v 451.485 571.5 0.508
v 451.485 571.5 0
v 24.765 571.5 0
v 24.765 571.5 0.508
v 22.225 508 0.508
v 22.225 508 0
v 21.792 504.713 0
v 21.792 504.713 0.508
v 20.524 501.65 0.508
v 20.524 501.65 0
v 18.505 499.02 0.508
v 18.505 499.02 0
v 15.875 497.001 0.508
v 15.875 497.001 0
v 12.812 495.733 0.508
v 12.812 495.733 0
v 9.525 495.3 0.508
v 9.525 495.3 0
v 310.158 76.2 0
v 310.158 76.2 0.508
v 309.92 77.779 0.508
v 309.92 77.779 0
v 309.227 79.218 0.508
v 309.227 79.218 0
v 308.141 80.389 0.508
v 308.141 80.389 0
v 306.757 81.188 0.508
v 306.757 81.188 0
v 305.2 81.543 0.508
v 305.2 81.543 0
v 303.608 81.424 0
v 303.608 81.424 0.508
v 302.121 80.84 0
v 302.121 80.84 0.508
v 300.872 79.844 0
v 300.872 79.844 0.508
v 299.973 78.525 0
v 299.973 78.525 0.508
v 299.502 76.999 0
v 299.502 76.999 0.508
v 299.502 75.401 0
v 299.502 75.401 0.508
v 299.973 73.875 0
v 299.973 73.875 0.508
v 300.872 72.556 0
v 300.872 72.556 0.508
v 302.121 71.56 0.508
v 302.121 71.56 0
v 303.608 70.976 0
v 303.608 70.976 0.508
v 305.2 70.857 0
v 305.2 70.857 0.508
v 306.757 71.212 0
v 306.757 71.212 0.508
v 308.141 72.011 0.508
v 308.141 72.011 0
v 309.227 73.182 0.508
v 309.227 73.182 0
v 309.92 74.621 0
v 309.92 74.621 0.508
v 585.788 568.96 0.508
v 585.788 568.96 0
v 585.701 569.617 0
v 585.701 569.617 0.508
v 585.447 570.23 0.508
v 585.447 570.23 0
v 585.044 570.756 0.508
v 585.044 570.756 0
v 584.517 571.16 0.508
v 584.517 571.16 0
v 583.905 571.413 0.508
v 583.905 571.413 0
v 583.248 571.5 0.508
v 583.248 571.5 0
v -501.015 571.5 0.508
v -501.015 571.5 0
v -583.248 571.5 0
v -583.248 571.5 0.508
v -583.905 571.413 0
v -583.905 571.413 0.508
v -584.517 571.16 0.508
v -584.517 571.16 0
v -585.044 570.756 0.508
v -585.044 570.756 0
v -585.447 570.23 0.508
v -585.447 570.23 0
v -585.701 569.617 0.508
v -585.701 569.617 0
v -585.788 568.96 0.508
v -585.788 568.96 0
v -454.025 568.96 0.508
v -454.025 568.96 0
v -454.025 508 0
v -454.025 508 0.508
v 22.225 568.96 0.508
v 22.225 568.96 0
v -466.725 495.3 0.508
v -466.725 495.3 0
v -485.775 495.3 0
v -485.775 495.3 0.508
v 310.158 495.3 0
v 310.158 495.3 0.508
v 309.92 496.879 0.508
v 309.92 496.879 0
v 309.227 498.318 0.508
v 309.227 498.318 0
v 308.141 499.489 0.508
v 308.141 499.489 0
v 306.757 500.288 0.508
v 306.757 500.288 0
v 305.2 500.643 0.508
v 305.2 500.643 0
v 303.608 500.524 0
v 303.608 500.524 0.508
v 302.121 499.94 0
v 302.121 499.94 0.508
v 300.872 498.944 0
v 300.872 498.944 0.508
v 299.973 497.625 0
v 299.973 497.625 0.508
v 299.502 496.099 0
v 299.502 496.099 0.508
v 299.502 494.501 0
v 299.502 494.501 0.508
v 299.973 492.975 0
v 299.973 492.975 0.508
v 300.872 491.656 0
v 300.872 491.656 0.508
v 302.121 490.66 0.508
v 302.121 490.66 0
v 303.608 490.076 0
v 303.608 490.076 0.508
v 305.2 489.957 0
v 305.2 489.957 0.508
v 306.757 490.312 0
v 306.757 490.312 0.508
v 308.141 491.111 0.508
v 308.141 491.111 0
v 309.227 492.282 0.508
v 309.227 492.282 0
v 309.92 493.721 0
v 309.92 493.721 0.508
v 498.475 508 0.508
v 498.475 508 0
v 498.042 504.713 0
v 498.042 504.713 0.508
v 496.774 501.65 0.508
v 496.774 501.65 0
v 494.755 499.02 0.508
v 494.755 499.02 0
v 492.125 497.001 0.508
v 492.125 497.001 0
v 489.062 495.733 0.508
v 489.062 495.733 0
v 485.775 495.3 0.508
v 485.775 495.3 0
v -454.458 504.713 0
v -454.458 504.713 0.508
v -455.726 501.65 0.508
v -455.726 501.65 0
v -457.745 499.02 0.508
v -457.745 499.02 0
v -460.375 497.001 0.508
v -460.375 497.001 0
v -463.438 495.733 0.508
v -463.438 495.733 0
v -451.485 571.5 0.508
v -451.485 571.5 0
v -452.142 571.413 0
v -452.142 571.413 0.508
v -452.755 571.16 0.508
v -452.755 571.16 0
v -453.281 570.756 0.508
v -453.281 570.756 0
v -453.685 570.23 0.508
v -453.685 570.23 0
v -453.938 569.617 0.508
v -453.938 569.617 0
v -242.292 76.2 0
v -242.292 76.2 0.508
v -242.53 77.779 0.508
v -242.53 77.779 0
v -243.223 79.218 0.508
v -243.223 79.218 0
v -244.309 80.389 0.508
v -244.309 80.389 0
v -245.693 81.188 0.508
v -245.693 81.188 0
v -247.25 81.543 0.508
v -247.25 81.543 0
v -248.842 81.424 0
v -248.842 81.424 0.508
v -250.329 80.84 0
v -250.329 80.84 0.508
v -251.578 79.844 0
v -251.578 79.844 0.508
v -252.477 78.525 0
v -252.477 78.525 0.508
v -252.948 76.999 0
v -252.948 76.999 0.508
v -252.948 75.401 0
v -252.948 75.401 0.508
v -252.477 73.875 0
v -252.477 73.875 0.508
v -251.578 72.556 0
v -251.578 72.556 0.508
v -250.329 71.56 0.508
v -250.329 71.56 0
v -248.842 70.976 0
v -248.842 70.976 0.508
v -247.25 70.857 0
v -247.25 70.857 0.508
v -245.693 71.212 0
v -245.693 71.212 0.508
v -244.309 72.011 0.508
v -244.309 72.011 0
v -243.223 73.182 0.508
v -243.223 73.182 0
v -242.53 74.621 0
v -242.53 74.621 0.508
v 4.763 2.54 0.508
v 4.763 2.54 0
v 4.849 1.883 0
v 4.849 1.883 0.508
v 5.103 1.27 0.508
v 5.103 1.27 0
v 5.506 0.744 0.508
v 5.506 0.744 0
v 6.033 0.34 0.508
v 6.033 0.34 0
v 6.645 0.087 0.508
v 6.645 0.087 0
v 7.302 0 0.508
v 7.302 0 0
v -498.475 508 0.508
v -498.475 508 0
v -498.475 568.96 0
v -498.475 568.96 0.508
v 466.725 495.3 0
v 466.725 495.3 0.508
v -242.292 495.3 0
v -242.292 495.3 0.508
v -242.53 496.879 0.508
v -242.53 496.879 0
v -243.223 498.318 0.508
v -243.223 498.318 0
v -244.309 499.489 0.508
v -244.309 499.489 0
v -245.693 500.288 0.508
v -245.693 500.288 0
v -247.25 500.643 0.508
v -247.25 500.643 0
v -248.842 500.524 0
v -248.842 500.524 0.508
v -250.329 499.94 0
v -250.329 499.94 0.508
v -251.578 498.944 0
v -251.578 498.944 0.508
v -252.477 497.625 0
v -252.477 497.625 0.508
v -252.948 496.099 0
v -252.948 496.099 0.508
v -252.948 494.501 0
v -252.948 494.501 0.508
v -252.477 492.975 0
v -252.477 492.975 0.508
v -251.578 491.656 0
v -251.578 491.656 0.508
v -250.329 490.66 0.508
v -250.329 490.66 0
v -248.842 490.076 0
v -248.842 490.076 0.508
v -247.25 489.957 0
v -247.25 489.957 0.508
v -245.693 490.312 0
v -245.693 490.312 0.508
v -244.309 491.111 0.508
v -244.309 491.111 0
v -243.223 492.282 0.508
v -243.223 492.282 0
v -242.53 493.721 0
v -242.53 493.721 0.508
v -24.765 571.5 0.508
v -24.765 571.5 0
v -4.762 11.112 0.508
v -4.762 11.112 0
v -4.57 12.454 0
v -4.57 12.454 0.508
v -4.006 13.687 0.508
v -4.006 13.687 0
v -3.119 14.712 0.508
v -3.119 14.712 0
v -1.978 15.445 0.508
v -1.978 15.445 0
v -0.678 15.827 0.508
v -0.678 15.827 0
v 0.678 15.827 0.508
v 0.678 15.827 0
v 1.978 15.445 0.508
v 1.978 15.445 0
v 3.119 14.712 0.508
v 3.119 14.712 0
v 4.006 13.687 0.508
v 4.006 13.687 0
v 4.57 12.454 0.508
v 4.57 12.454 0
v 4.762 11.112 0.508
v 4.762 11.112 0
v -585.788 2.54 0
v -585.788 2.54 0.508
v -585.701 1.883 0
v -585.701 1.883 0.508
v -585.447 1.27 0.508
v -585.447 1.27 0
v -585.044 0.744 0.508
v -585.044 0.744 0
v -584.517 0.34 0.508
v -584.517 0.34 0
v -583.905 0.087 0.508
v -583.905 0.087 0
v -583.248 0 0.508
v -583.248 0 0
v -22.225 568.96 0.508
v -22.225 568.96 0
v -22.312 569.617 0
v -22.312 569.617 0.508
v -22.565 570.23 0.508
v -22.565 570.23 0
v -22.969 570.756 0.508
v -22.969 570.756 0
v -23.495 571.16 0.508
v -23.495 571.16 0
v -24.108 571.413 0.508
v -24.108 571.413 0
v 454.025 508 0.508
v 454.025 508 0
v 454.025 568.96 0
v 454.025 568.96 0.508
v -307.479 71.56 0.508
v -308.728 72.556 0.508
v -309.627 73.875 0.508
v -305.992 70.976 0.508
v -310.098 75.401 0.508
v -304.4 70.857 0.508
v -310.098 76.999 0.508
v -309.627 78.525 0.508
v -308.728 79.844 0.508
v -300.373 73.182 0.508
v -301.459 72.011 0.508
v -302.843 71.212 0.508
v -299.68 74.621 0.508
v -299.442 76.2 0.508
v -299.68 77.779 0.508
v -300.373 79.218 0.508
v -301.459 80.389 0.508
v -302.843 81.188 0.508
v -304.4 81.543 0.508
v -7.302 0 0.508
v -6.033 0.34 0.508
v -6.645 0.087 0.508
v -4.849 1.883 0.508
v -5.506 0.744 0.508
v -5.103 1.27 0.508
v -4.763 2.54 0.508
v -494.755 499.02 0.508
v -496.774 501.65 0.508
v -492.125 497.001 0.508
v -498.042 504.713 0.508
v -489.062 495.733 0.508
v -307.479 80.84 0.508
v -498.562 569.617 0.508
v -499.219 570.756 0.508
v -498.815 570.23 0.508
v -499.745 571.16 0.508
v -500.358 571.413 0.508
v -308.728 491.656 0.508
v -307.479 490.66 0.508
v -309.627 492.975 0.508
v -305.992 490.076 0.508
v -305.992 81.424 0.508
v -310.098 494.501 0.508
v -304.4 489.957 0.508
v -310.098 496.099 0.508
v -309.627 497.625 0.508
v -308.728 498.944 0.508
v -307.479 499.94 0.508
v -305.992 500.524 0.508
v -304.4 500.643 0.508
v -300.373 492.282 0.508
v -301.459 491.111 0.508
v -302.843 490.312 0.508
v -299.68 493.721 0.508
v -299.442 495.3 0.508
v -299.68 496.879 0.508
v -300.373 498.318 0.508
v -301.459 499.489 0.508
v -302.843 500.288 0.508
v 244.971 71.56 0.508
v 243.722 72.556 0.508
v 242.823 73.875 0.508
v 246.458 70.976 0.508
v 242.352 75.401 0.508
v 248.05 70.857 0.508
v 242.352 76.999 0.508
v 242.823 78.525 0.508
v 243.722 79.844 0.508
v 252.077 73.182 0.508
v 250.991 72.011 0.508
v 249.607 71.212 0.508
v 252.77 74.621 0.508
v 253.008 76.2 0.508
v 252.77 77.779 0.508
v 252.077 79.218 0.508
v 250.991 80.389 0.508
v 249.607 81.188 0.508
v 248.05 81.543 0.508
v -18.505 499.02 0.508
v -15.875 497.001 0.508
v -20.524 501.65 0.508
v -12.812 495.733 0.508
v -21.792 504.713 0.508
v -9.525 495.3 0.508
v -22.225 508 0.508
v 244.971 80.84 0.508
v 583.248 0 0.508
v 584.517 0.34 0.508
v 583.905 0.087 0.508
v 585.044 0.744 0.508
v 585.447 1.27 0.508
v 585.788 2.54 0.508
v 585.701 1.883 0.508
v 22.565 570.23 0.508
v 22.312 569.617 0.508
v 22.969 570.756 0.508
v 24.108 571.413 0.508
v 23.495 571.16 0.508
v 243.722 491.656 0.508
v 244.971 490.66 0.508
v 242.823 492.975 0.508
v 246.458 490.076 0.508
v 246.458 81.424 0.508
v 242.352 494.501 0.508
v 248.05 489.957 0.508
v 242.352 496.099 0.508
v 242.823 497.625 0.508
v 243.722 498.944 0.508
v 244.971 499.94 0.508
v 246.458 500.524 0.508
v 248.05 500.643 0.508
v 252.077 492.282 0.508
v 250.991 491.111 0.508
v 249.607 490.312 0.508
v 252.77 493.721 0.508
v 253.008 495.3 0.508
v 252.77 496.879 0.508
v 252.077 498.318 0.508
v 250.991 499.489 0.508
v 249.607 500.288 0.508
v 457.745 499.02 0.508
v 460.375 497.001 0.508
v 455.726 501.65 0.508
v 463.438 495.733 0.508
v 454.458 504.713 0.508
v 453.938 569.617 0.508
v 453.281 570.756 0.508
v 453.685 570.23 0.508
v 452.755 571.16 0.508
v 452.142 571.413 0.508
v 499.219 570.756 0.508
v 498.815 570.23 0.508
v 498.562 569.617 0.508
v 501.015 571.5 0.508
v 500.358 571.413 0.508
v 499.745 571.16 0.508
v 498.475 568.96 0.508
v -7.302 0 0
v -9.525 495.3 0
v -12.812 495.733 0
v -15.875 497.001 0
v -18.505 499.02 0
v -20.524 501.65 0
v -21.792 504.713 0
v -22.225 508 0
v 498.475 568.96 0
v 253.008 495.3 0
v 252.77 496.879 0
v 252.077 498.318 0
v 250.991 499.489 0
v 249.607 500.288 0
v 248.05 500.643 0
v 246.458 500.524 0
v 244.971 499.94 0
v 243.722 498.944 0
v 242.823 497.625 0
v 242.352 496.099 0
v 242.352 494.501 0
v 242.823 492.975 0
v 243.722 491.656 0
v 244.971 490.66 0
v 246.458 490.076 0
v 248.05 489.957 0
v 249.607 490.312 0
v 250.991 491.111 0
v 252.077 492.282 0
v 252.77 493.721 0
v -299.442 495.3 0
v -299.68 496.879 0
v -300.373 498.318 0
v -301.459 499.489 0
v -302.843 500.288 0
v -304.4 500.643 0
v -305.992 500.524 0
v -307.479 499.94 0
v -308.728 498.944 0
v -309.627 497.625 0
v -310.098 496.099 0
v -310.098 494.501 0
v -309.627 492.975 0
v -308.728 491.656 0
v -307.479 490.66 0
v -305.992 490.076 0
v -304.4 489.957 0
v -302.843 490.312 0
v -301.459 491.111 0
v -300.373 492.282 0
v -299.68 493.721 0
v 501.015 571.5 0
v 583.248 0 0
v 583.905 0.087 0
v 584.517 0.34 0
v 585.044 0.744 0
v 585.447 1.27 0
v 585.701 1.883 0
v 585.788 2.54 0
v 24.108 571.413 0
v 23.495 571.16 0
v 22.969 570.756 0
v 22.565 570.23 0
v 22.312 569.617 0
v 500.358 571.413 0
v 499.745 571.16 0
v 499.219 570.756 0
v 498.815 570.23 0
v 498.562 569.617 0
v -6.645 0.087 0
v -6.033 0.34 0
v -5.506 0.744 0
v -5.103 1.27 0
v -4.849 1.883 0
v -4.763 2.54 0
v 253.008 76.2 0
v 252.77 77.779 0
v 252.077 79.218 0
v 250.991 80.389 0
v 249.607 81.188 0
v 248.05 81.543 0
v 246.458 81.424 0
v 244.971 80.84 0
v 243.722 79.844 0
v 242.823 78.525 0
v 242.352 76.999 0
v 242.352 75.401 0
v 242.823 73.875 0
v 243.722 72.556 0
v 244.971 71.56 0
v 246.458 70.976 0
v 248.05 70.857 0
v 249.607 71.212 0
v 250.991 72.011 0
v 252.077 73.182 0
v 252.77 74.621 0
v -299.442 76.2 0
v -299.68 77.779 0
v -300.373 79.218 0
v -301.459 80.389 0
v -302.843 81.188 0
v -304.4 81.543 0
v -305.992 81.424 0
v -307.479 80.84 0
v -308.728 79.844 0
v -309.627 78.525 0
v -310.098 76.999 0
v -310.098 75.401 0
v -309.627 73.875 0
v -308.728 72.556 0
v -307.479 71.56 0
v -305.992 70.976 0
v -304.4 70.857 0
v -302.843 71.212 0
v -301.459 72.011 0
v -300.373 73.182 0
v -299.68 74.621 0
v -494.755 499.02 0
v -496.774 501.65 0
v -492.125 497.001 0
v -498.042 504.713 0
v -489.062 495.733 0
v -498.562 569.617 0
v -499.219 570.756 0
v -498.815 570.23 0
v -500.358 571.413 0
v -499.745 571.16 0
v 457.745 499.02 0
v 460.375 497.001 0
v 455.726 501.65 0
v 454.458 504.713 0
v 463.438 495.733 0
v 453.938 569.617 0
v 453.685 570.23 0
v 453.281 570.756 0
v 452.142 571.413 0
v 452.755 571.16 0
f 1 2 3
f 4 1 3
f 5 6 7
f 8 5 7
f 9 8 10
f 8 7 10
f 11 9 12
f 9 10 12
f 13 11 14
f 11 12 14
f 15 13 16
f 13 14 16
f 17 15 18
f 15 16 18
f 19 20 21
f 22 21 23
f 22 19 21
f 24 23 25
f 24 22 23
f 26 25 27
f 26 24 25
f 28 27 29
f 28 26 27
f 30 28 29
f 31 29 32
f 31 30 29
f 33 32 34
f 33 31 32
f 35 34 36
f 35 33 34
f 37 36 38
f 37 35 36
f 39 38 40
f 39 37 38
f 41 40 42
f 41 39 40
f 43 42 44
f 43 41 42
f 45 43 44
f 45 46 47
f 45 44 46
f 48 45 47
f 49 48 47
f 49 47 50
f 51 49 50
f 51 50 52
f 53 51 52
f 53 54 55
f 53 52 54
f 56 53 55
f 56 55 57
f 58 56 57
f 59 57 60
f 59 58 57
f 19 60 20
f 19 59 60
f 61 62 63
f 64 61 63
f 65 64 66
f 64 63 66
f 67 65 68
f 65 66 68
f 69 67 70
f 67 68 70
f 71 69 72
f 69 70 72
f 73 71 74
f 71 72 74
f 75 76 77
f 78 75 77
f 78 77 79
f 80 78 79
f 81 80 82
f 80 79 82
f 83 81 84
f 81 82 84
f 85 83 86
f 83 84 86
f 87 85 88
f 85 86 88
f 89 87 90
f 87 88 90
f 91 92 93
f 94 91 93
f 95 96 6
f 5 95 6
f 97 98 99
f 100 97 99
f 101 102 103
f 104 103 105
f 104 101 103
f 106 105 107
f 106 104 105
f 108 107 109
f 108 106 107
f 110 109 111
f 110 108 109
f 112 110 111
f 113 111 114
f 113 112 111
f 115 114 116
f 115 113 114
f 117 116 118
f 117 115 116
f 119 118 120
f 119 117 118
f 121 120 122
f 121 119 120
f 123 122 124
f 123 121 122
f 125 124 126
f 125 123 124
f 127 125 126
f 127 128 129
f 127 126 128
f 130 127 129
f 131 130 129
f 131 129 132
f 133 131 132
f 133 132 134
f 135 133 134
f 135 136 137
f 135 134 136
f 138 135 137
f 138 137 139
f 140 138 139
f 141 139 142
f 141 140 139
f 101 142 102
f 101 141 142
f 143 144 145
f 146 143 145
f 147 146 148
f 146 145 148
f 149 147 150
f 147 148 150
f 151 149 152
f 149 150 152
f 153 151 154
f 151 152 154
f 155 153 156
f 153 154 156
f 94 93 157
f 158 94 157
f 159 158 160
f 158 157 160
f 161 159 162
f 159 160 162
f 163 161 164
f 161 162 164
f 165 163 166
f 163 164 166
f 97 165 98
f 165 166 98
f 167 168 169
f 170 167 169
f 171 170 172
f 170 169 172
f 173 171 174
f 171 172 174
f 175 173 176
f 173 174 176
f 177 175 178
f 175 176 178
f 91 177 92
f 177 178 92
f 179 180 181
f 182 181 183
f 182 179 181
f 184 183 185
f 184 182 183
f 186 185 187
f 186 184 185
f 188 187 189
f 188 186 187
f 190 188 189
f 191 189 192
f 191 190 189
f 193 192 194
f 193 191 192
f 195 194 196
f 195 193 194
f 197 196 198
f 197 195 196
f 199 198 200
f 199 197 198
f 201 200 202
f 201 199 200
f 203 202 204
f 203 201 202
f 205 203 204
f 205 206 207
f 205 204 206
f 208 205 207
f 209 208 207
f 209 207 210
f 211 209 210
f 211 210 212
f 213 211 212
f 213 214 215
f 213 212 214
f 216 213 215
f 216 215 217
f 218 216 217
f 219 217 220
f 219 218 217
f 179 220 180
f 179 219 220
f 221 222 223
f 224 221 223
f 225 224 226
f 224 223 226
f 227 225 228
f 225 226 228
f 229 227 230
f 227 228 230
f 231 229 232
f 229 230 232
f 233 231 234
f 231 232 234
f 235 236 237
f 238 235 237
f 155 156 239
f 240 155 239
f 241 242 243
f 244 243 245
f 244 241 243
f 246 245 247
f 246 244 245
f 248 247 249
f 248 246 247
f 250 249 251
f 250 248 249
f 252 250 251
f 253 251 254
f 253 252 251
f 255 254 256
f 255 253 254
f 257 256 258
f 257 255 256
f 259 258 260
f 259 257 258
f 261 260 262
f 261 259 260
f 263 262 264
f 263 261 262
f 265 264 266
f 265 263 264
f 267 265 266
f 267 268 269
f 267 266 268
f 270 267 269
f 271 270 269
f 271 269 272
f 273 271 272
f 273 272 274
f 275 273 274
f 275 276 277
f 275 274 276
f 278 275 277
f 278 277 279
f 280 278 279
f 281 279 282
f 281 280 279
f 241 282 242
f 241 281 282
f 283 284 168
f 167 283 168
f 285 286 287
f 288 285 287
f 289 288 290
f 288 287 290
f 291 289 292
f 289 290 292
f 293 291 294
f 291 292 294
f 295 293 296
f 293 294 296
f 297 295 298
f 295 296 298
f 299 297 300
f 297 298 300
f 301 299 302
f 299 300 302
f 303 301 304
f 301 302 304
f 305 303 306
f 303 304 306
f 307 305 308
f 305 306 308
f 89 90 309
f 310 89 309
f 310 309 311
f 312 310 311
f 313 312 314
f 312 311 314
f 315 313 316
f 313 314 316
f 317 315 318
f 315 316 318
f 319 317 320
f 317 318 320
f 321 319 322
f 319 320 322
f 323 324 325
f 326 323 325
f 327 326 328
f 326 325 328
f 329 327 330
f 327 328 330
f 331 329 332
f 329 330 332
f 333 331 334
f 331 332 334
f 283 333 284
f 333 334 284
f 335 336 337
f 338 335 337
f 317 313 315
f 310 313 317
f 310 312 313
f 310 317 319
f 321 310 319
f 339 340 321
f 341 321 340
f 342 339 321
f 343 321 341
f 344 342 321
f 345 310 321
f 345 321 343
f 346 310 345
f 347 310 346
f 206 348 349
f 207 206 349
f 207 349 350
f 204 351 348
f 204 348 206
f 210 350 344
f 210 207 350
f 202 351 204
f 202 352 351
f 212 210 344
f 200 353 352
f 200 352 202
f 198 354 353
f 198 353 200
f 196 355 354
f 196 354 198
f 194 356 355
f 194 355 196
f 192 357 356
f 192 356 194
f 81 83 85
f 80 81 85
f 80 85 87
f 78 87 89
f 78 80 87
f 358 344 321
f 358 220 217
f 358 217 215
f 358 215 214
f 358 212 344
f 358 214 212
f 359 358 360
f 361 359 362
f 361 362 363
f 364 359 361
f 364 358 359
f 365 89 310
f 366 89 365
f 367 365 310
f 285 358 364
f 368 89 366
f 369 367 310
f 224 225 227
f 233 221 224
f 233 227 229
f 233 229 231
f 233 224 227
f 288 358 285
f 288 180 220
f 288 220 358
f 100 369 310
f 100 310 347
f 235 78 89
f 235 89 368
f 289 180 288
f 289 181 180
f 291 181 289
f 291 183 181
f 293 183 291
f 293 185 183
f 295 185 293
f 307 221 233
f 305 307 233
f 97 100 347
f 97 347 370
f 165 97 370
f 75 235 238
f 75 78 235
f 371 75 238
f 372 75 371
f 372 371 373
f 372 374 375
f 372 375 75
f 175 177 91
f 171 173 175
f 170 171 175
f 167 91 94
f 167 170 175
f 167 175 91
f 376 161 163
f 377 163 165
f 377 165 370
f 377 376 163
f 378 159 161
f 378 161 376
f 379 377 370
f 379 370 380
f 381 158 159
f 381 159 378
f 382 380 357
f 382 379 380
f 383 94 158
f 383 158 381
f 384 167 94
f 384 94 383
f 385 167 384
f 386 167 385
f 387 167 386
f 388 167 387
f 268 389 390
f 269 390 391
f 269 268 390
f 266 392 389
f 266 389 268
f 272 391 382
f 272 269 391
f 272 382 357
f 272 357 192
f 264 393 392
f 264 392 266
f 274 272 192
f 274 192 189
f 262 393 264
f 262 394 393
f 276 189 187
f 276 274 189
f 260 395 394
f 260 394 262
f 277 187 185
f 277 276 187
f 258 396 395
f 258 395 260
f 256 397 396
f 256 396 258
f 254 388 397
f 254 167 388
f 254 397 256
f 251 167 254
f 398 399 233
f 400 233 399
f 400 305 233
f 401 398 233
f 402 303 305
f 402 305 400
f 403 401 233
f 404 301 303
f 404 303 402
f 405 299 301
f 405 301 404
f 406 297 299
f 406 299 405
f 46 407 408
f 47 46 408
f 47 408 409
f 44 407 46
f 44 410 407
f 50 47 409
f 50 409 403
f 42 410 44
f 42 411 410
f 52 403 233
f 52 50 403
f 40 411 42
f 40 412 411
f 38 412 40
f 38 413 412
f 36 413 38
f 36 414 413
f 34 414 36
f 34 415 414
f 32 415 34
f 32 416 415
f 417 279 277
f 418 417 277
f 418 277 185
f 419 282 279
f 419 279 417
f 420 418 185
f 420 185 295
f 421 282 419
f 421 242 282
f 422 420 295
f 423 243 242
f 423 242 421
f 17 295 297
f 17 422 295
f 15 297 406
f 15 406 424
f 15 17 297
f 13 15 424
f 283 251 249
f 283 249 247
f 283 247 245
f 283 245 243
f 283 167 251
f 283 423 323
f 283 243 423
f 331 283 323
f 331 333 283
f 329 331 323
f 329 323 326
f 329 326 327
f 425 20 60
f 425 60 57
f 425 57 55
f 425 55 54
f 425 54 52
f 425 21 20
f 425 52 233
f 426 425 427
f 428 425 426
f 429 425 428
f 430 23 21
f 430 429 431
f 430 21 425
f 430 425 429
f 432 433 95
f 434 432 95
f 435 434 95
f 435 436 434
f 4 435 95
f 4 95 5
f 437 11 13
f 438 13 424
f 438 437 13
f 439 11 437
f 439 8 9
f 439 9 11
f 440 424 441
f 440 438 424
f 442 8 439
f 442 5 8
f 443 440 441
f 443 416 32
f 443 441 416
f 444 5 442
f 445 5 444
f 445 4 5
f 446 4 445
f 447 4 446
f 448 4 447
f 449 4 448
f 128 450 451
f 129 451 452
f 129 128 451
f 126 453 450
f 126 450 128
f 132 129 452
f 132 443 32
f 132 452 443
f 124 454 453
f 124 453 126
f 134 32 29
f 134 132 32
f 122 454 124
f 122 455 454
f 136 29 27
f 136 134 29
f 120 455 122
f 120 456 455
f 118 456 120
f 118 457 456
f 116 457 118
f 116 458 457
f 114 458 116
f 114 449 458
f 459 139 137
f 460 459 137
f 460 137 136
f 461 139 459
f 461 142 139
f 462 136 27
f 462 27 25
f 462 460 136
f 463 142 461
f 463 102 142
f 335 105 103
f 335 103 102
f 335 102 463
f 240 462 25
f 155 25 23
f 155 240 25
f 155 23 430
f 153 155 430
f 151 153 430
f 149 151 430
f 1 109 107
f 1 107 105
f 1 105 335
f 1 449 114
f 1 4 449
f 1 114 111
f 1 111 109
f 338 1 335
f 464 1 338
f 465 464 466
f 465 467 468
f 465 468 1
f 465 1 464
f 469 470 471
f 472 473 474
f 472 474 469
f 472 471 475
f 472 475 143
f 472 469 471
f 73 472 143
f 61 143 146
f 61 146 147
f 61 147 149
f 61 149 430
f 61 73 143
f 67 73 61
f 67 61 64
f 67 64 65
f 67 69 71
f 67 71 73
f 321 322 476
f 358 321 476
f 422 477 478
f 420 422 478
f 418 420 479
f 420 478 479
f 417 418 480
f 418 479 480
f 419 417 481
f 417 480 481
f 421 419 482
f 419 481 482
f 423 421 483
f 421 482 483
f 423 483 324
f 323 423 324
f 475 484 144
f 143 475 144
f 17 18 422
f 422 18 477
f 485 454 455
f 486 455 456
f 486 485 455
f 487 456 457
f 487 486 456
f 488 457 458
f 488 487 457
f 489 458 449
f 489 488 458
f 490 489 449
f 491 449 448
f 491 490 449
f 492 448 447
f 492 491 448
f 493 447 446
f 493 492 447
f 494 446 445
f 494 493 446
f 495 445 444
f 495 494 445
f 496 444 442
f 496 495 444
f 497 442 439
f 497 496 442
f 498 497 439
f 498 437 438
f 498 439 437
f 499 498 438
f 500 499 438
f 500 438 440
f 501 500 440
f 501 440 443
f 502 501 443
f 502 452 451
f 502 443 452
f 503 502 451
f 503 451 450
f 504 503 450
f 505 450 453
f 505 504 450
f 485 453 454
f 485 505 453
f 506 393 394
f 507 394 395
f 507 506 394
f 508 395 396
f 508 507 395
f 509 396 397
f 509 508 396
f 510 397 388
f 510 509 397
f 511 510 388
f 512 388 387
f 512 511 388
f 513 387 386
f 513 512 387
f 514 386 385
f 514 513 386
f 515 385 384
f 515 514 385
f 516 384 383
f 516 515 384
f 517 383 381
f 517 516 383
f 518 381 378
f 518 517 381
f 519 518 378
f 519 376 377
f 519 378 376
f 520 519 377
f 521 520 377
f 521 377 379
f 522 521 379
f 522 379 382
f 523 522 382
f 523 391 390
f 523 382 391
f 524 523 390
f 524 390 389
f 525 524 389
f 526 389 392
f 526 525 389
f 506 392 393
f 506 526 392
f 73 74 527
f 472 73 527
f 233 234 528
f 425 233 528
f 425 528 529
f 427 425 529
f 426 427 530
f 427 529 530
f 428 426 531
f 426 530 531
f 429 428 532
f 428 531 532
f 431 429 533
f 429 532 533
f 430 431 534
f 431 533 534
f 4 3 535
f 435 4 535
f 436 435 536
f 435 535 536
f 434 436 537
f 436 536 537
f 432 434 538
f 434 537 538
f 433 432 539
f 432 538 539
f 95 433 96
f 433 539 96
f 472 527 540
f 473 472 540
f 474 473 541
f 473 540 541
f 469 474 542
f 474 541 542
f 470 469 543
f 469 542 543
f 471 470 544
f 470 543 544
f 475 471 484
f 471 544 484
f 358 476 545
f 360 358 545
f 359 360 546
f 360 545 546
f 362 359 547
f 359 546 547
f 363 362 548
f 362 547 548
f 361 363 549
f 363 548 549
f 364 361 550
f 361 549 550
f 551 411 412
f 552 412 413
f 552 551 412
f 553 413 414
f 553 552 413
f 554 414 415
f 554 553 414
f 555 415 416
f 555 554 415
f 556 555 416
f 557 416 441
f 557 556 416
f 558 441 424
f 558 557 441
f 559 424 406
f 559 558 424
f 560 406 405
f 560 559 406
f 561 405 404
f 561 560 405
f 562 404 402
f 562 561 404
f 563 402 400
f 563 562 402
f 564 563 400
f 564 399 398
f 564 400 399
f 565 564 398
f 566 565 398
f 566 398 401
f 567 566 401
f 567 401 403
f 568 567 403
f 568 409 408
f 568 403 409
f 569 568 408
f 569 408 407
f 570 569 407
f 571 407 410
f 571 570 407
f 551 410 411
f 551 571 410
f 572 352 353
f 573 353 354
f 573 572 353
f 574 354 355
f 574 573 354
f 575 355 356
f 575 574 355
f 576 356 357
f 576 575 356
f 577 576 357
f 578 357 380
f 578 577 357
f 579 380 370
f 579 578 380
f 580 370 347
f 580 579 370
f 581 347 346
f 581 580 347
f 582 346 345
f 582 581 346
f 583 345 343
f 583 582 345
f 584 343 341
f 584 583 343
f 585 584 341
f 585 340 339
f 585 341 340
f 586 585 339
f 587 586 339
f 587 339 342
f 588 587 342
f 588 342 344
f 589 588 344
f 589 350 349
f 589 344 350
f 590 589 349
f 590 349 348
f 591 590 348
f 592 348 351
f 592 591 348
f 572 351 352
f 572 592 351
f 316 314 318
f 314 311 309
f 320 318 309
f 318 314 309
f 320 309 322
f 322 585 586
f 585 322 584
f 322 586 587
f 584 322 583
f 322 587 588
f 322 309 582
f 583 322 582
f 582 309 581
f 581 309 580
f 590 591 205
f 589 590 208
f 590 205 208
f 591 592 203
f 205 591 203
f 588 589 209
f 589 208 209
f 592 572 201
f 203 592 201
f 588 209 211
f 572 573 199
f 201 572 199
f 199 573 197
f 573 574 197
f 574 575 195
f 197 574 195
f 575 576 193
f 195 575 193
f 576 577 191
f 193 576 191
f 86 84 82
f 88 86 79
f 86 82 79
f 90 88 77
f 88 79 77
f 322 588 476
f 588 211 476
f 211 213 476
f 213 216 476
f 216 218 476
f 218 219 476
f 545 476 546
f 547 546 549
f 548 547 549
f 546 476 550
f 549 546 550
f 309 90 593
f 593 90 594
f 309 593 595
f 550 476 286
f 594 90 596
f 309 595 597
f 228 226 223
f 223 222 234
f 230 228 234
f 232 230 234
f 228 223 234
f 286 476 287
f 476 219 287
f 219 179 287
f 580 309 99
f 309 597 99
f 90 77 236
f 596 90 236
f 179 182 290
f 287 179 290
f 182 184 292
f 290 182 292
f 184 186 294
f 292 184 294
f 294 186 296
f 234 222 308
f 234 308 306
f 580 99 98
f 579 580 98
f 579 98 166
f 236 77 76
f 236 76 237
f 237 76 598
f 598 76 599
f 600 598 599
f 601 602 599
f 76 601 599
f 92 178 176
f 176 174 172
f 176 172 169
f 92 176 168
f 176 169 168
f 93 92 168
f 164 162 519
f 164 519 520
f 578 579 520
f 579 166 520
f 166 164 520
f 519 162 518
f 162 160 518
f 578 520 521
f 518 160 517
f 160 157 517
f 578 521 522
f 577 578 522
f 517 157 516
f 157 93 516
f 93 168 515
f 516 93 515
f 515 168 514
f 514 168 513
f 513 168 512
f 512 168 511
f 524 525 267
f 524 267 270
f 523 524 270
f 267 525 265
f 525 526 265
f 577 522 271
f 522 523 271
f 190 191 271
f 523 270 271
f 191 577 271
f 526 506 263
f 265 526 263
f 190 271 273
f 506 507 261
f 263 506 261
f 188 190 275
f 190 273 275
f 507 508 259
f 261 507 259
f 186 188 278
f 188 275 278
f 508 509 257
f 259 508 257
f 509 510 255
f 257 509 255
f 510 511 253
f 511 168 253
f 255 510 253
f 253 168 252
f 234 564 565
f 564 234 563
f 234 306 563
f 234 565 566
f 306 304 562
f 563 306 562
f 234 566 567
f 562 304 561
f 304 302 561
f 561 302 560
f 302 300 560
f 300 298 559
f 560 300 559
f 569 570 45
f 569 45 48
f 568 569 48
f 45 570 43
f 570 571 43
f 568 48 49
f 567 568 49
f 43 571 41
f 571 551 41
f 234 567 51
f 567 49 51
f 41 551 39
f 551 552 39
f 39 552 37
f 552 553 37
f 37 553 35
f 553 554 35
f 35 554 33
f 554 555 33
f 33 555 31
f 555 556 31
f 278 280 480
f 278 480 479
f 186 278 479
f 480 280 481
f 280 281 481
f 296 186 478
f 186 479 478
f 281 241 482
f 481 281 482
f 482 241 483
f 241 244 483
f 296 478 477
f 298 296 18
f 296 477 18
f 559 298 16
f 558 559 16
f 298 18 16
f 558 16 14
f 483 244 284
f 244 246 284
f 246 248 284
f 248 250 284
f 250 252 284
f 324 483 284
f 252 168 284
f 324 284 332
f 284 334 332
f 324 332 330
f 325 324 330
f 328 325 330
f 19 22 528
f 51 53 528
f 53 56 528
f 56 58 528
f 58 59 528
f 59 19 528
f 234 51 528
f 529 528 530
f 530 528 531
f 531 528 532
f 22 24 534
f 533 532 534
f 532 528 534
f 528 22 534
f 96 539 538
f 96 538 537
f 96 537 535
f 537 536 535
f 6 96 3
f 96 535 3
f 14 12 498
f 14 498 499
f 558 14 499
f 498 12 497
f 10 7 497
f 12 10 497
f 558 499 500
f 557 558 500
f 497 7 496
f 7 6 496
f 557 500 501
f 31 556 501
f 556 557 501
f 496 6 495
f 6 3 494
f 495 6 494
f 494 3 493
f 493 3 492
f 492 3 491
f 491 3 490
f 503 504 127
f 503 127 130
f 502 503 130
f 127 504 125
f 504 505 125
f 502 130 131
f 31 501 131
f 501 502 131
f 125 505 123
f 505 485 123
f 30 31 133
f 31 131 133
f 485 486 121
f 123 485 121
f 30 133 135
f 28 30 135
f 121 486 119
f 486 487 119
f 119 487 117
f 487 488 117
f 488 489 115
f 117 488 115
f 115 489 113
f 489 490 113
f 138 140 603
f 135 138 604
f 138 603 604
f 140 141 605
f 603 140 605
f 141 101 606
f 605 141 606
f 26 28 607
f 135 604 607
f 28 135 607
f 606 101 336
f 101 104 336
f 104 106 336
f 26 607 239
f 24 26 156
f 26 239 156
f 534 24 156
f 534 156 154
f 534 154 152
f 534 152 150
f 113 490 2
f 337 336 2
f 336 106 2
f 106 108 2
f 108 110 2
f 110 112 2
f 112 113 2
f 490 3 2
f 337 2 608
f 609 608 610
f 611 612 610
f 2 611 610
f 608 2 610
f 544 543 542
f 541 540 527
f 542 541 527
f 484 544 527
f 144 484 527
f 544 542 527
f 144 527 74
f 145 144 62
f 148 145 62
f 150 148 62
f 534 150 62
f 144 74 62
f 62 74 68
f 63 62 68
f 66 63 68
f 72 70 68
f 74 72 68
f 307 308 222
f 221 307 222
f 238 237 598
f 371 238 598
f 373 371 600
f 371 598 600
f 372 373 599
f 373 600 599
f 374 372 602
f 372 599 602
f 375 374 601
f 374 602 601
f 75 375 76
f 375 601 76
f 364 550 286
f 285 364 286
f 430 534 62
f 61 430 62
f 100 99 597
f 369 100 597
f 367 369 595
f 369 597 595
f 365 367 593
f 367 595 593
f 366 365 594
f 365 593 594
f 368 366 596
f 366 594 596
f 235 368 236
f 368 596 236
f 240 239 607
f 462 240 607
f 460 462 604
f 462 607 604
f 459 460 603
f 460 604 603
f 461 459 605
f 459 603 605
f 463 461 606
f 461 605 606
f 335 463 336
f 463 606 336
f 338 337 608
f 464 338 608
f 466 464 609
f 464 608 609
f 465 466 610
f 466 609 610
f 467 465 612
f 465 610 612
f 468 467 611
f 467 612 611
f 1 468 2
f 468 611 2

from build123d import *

# Parameters (mm, degrees)
GE_22344_OUTLINE_R = 5.357876
GE_22344_DEPTH     = 6.35
CUT_EXTRUDE1_START = -5.842
CUT_EXTRUDE1_DEPTH = 5.842


# Read off the part's stored shape, not the designer's step: GE-22344
with BuildPart() as part:
    # GE-22344 outline → GE-22344 (new body)
    with BuildSketch(Plane.XY):
        with BuildLine():
            Line((7.3025, 0), (583.2475, 0))
            ThreePointArc((583.2475, 0), (585.043551224, 0.743948776), (585.7875, 2.54))
            Line((585.7875, 2.54), (585.7875, 568.96))
            ThreePointArc((585.7875, 568.96), (585.043551224, 570.756051224), (583.2475, 571.5))
            Line((583.2475, 571.5), (501.015, 571.5))
            ThreePointArc((501.015, 571.5), (499.218948776, 570.756051224), (498.475, 568.96))
            Line((498.475, 568.96), (498.475, 508))
            ThreePointArc((498.475, 508), (494.755256121, 499.019743879), (485.775, 495.3))
            Line((485.775, 495.3), (466.725, 495.3))
            ThreePointArc((466.725, 495.3), (457.744743879, 499.019743879), (454.025, 508))
            Line((454.025, 508), (454.025, 568.96))
            ThreePointArc((454.025, 568.96), (453.281051224, 570.756051224), (451.485, 571.5))
            Line((451.485, 571.5), (24.765, 571.5))
            ThreePointArc((24.765, 571.5), (22.968948776, 570.756051224), (22.225, 568.96))
            Line((22.225, 568.96), (22.225, 508))
            ThreePointArc((22.225, 508), (18.505256121, 499.019743879), (9.525, 495.3))
            Line((9.525, 495.3), (-9.525, 495.3))
            ThreePointArc((-9.525, 495.3), (-18.505256121, 499.019743879), (-22.225, 508))
            Line((-22.225, 508), (-22.225, 568.96))
            ThreePointArc((-22.225, 568.96), (-22.968948776, 570.756051224), (-24.765, 571.5))
            Line((-24.765, 571.5), (-451.485, 571.5))
            ThreePointArc((-451.485, 571.5), (-453.281051224, 570.756051224), (-454.025, 568.96))
            Line((-454.025, 568.96), (-454.025, 508))
            ThreePointArc((-454.025, 508), (-457.744743879, 499.019743879), (-466.725, 495.3))
            Line((-466.725, 495.3), (-485.775, 495.3))
            ThreePointArc((-485.775, 495.3), (-494.755256121, 499.019743879), (-498.475, 508))
            Line((-498.475, 508), (-498.475, 568.96))
            ThreePointArc((-498.475, 568.96), (-499.218948776, 570.756051224), (-501.015, 571.5))
            Line((-501.015, 571.5), (-583.2475, 571.5))
            ThreePointArc((-583.2475, 571.5), (-585.043551224, 570.756051224), (-585.7875, 568.96))
            Line((-585.7875, 568.96), (-585.7875, 2.54))
            ThreePointArc((-585.7875, 2.54), (-585.043551224, 0.743948776), (-583.2475, 0))
            Line((-583.2475, 0), (-7.3025, 0))
            ThreePointArc((-7.3025, 0), (-5.506448776, 0.743948776), (-4.7625, 2.54))
            Line((-4.7625, 2.54), (-4.7625, 11.1125))
            ThreePointArc((-4.7625, 11.1125), (0, 15.875), (4.7625, 11.1125))
            Line((4.7625, 11.1125), (4.7625, 2.54))
            ThreePointArc((4.7625, 2.54), (5.506448776, 0.743948776), (7.3025, 0))
        make_face()
        with Locations((-304.8, 76.2)):
            Circle(GE_22344_OUTLINE_R, mode=Mode.SUBTRACT)
        with Locations((-247.65, 76.2)):
            Circle(GE_22344_OUTLINE_R, mode=Mode.SUBTRACT)
        with Locations((247.65, 76.2)):
            Circle(GE_22344_OUTLINE_R, mode=Mode.SUBTRACT)
        with Locations((304.8, 76.2)):
            Circle(GE_22344_OUTLINE_R, mode=Mode.SUBTRACT)
        with Locations((-304.8, 495.3)):
            Circle(GE_22344_OUTLINE_R, mode=Mode.SUBTRACT)
        with Locations((-247.65, 495.3)):
            Circle(GE_22344_OUTLINE_R, mode=Mode.SUBTRACT)
        with Locations((247.65, 495.3)):
            Circle(GE_22344_OUTLINE_R, mode=Mode.SUBTRACT)
        with Locations((304.8, 495.3)):
            Circle(GE_22344_OUTLINE_R, mode=Mode.SUBTRACT)
    extrude(amount=GE_22344_DEPTH)

    # Sketch4 → Cut-Extrude1 (cut)
    with BuildSketch(Plane.XY.offset(6.35).offset(CUT_EXTRUDE1_START)):
        with BuildLine():
            Line((-583.2475, 0), (-7.3025, 0))
            ThreePointArc((-7.3025, 0), (-5.506448776, 0.743948776), (-4.7625, 2.54))
            Line((-4.7625, 2.54), (-4.7625, 11.1125))
            ThreePointArc((-4.7625, 11.1125), (0, 15.875), (4.7625, 11.1125))
            Line((4.7625, 11.1125), (4.7625, 2.54))
            ThreePointArc((4.7625, 2.54), (5.506448776, 0.743948776), (7.3025, 0))
            Line((7.3025, 0), (583.2475, 0))
            ThreePointArc((583.2475, 0), (585.043551224, 0.743948776), (585.7875, 2.54))
            Line((585.7875, 2.54), (585.7875, 568.96))
            ThreePointArc((585.7875, 568.96), (585.043551224, 570.756051224), (583.2475, 571.5))
            Line((583.2475, 571.5), (501.015, 571.5))
            ThreePointArc((501.015, 571.5), (499.218948776, 570.756051224), (498.475, 568.96))
            Line((498.475, 568.96), (498.475, 508))
            ThreePointArc((498.475, 508), (494.755256121, 499.019743879), (485.775, 495.3))
            Line((485.775, 495.3), (466.725, 495.3))
            ThreePointArc((466.725, 495.3), (457.744743879, 499.019743879), (454.025, 508))
            Line((454.025, 508), (454.025, 568.96))
            ThreePointArc((454.025, 568.96), (453.281051224, 570.756051224), (451.485, 571.5))
            Line((451.485, 571.5), (24.765, 571.5))
            ThreePointArc((24.765, 571.5), (22.968948776, 570.756051224), (22.225, 568.96))
            Line((22.225, 568.96), (22.225, 508))
            ThreePointArc((22.225, 508), (18.505256121, 499.019743879), (9.525, 495.3))
            Line((9.525, 495.3), (-9.525, 495.3))
            ThreePointArc((-9.525, 495.3), (-18.505256121, 499.019743879), (-22.225, 508))
            Line((-22.225, 508), (-22.225, 568.96))
            ThreePointArc((-22.225, 568.96), (-22.968948776, 570.756051224), (-24.765, 571.5))
            Line((-24.765, 571.5), (-451.485, 571.5))
            ThreePointArc((-451.485, 571.5), (-453.281051224, 570.756051224), (-454.025, 568.96))
            Line((-454.025, 568.96), (-454.025, 508))
            ThreePointArc((-454.025, 508), (-457.744743879, 499.019743879), (-466.725, 495.3))
            Line((-466.725, 495.3), (-485.775, 495.3))
            ThreePointArc((-485.775, 495.3), (-494.755256121, 499.019743879), (-498.475, 508))
            Line((-498.475, 508), (-498.475, 568.96))
            ThreePointArc((-498.475, 568.96), (-499.218948776, 570.756051224), (-501.015, 571.5))
            Line((-501.015, 571.5), (-583.2475, 571.5))
            ThreePointArc((-583.2475, 571.5), (-585.043551224, 570.756051224), (-585.7875, 568.96))
            Line((-585.7875, 568.96), (-585.7875, 2.54))
            ThreePointArc((-585.7875, 2.54), (-585.043551224, 0.743948776), (-583.2475, 0))
        make_face()
    extrude(amount=CUT_EXTRUDE1_DEPTH, mode=Mode.SUBTRACT)


solid = part.part
